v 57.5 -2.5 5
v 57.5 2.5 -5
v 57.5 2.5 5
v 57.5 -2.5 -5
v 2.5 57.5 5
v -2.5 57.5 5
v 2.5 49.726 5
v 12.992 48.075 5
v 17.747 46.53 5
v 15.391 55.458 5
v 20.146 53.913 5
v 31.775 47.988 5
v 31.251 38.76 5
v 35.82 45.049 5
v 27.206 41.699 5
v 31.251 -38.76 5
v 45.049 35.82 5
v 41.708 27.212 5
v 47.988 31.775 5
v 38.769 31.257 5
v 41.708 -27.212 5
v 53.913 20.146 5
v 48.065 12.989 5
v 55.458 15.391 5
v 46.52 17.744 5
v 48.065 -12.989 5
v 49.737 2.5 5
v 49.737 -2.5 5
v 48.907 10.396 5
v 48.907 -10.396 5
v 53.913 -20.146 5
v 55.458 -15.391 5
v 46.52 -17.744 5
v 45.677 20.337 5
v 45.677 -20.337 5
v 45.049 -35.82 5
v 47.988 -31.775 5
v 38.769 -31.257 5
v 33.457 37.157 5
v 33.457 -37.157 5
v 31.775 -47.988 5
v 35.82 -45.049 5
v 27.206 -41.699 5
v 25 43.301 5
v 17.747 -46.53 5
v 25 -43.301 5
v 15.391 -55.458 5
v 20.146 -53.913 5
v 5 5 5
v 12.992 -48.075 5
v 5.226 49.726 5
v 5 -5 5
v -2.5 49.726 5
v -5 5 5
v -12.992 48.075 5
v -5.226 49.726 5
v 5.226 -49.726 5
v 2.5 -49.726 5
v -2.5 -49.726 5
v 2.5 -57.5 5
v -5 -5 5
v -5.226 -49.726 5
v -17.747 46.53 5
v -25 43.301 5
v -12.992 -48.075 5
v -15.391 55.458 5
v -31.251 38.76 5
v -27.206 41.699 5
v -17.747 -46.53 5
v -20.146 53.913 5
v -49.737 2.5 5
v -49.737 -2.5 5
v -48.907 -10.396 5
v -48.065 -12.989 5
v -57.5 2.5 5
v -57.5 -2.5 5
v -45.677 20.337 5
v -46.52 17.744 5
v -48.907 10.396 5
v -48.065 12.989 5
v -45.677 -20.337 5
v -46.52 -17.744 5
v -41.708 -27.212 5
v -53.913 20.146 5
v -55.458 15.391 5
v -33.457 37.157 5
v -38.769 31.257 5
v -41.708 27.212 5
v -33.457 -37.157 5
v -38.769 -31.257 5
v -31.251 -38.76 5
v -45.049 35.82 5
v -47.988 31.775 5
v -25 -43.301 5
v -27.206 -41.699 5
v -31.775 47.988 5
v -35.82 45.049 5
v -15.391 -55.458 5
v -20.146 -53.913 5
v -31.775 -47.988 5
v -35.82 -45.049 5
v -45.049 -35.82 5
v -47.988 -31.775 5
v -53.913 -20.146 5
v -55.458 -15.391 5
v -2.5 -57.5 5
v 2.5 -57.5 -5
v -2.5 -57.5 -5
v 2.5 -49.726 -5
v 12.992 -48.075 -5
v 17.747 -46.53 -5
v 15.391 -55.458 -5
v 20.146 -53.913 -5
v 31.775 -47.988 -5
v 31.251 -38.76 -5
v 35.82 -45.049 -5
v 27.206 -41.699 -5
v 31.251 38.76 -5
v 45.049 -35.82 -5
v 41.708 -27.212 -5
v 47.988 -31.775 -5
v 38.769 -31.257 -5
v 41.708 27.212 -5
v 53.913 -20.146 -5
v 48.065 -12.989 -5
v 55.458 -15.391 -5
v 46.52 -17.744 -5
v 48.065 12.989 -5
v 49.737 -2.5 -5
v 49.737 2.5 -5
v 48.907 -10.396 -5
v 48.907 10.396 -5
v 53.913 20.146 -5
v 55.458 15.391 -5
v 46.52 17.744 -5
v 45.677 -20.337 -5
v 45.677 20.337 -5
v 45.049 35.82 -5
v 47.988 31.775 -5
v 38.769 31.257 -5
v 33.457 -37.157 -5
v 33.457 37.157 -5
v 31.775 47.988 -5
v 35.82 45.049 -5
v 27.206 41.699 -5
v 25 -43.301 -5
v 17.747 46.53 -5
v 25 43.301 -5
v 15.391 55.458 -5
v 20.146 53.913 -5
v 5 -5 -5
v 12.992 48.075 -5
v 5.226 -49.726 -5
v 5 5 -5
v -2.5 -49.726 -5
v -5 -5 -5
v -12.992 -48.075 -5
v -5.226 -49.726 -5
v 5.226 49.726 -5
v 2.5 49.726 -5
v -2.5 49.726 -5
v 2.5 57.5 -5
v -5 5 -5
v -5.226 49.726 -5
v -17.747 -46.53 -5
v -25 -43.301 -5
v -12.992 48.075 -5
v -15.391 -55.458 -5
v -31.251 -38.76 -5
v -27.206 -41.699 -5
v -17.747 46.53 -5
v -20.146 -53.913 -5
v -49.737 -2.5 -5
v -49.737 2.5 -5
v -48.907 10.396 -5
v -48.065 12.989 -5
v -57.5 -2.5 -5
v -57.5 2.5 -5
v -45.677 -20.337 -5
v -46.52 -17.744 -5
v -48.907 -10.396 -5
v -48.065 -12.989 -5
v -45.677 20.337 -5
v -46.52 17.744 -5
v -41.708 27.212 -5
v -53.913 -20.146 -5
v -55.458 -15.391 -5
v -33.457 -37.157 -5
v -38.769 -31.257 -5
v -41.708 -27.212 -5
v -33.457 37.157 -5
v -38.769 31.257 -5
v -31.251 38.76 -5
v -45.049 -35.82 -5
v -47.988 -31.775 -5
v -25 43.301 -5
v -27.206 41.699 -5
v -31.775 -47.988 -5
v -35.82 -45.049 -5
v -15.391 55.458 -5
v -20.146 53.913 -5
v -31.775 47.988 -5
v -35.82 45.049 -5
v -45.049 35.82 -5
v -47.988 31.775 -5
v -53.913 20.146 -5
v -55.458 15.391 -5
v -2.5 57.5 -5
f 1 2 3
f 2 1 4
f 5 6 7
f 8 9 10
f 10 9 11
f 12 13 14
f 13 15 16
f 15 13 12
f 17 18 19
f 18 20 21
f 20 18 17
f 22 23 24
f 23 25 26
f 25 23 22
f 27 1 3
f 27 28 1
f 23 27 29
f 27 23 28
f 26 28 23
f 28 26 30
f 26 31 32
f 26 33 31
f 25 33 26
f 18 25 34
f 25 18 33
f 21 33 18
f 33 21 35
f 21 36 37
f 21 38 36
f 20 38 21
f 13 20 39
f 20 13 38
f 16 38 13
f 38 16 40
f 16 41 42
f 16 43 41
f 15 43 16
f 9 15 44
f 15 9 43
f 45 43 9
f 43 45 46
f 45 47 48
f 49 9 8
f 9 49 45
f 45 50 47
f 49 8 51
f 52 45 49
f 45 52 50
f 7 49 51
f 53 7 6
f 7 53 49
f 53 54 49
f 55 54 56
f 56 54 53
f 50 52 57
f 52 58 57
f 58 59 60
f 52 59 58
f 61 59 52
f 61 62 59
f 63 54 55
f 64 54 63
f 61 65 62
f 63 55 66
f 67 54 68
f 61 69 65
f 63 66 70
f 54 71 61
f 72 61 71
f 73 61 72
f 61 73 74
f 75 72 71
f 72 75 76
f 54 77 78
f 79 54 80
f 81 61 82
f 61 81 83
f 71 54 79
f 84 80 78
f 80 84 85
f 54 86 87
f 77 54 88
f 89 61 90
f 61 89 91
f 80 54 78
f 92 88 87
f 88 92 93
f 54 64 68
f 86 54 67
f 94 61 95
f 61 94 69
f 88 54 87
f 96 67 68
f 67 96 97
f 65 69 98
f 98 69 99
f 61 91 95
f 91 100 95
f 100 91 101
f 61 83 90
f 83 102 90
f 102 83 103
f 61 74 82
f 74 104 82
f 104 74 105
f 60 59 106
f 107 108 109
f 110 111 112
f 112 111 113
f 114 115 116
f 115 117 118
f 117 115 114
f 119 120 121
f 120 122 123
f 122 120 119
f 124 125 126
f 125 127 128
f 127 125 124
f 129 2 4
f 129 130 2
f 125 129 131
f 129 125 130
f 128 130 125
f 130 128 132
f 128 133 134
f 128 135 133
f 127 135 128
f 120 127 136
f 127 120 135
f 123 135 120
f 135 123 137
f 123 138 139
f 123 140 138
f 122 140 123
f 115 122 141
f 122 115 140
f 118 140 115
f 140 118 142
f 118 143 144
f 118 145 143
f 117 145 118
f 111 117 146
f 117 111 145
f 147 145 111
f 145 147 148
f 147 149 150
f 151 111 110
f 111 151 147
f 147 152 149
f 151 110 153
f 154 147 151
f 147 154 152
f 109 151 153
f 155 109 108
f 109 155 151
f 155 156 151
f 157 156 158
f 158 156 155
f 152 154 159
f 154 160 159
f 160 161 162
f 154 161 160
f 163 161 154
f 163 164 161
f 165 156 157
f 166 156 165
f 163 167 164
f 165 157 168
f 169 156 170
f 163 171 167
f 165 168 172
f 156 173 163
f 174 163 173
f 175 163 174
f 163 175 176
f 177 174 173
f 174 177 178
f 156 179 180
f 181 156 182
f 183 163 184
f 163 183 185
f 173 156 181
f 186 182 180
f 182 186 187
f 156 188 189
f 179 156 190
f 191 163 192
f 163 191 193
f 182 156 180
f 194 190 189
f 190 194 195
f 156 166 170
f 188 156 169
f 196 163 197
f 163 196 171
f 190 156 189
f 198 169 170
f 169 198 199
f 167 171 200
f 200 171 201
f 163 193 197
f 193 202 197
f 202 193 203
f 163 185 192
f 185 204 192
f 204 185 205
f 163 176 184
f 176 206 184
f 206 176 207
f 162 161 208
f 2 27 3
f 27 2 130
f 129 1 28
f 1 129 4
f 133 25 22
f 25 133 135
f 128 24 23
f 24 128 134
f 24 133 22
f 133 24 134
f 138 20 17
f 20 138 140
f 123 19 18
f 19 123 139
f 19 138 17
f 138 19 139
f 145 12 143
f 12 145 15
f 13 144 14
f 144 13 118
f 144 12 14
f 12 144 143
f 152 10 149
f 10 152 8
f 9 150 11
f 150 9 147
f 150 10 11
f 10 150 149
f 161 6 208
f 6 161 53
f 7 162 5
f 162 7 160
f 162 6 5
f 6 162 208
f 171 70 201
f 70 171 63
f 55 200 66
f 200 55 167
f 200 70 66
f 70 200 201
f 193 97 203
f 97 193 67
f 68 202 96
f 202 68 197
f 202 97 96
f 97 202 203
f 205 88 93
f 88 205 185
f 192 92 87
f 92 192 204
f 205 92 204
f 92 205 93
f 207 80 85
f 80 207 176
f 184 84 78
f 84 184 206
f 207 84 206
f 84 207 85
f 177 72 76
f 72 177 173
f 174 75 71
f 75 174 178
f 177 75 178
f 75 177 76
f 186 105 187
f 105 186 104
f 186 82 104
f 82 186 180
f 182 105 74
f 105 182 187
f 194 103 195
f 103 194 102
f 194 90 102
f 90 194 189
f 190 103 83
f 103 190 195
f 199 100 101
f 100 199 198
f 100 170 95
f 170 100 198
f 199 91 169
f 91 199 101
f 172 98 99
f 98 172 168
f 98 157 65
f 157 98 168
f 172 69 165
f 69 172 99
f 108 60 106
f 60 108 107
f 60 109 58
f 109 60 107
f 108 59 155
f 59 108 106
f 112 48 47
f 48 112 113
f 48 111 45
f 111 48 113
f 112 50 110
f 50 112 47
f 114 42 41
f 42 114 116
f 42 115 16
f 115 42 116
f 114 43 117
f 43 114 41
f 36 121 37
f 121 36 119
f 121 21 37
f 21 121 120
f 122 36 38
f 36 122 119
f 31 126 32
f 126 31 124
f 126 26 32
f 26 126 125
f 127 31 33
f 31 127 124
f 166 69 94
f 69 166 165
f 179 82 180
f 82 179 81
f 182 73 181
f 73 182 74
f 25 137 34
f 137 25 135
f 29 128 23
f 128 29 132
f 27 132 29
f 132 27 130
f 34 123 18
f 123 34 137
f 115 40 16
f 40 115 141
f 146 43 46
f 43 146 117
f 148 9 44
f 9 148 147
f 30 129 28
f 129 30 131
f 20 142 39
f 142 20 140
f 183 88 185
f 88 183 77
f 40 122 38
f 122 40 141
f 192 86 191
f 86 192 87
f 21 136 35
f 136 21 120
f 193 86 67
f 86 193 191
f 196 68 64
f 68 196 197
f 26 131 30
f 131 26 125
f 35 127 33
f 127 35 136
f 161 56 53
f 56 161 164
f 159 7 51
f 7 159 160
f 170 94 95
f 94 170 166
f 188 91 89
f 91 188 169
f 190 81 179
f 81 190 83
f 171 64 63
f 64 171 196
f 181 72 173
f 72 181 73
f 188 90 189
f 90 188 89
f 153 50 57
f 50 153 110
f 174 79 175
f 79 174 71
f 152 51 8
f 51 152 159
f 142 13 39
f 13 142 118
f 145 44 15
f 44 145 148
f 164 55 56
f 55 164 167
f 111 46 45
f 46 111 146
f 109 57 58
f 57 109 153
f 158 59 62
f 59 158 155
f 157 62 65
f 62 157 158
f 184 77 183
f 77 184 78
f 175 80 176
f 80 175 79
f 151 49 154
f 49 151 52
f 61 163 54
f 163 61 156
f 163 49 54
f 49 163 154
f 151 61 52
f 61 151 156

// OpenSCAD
/**
 * Parametric gear
 * Model jednoduchého ozubeného kola
 * Zuby je pro uznání nutné dělat forcykly!
 * @param gear_rad Poloměr ozubeného kola
 * @param gear_thickness Tloušťka kola
 * @param center_hole_width Šířka čtverce uprostřed kola
 * @param tooth_width Šířka jednoho zubu
 * @param tooth_prot Výstup zubu (jak moc je vystouplý zub)
 * @param tooth_count Počet zubů na ozubeném kolu po obvodu
 * @author Marek Žehra
 */
 
//#import("stls/gear.stl");

module gear(
    gear_rad=50,
    gear_thickness=10,
    center_hole_width=10,
    tooth_width=5,
    tooth_prot=5,
    tooth_count=20
)  {
    
    difference() {
        union(){
            translate([0,0,-gear_thickness/2])
                cylinder( r=gear_rad, h=gear_thickness );
                for( i=[0:tooth_count-1]) {
                    rotate([0,0,i*360/tooth_count])
                        translate ([gear_rad+tooth_prot/2,0,0])
                            cube([2*tooth_prot,tooth_width,gear_thickness],center=true);
                }
            }
        
        cube(
            [center_hole_width,
             center_hole_width,
             gear_thickness*2],
            center=true
        );
    }
    

    
}

gear();
